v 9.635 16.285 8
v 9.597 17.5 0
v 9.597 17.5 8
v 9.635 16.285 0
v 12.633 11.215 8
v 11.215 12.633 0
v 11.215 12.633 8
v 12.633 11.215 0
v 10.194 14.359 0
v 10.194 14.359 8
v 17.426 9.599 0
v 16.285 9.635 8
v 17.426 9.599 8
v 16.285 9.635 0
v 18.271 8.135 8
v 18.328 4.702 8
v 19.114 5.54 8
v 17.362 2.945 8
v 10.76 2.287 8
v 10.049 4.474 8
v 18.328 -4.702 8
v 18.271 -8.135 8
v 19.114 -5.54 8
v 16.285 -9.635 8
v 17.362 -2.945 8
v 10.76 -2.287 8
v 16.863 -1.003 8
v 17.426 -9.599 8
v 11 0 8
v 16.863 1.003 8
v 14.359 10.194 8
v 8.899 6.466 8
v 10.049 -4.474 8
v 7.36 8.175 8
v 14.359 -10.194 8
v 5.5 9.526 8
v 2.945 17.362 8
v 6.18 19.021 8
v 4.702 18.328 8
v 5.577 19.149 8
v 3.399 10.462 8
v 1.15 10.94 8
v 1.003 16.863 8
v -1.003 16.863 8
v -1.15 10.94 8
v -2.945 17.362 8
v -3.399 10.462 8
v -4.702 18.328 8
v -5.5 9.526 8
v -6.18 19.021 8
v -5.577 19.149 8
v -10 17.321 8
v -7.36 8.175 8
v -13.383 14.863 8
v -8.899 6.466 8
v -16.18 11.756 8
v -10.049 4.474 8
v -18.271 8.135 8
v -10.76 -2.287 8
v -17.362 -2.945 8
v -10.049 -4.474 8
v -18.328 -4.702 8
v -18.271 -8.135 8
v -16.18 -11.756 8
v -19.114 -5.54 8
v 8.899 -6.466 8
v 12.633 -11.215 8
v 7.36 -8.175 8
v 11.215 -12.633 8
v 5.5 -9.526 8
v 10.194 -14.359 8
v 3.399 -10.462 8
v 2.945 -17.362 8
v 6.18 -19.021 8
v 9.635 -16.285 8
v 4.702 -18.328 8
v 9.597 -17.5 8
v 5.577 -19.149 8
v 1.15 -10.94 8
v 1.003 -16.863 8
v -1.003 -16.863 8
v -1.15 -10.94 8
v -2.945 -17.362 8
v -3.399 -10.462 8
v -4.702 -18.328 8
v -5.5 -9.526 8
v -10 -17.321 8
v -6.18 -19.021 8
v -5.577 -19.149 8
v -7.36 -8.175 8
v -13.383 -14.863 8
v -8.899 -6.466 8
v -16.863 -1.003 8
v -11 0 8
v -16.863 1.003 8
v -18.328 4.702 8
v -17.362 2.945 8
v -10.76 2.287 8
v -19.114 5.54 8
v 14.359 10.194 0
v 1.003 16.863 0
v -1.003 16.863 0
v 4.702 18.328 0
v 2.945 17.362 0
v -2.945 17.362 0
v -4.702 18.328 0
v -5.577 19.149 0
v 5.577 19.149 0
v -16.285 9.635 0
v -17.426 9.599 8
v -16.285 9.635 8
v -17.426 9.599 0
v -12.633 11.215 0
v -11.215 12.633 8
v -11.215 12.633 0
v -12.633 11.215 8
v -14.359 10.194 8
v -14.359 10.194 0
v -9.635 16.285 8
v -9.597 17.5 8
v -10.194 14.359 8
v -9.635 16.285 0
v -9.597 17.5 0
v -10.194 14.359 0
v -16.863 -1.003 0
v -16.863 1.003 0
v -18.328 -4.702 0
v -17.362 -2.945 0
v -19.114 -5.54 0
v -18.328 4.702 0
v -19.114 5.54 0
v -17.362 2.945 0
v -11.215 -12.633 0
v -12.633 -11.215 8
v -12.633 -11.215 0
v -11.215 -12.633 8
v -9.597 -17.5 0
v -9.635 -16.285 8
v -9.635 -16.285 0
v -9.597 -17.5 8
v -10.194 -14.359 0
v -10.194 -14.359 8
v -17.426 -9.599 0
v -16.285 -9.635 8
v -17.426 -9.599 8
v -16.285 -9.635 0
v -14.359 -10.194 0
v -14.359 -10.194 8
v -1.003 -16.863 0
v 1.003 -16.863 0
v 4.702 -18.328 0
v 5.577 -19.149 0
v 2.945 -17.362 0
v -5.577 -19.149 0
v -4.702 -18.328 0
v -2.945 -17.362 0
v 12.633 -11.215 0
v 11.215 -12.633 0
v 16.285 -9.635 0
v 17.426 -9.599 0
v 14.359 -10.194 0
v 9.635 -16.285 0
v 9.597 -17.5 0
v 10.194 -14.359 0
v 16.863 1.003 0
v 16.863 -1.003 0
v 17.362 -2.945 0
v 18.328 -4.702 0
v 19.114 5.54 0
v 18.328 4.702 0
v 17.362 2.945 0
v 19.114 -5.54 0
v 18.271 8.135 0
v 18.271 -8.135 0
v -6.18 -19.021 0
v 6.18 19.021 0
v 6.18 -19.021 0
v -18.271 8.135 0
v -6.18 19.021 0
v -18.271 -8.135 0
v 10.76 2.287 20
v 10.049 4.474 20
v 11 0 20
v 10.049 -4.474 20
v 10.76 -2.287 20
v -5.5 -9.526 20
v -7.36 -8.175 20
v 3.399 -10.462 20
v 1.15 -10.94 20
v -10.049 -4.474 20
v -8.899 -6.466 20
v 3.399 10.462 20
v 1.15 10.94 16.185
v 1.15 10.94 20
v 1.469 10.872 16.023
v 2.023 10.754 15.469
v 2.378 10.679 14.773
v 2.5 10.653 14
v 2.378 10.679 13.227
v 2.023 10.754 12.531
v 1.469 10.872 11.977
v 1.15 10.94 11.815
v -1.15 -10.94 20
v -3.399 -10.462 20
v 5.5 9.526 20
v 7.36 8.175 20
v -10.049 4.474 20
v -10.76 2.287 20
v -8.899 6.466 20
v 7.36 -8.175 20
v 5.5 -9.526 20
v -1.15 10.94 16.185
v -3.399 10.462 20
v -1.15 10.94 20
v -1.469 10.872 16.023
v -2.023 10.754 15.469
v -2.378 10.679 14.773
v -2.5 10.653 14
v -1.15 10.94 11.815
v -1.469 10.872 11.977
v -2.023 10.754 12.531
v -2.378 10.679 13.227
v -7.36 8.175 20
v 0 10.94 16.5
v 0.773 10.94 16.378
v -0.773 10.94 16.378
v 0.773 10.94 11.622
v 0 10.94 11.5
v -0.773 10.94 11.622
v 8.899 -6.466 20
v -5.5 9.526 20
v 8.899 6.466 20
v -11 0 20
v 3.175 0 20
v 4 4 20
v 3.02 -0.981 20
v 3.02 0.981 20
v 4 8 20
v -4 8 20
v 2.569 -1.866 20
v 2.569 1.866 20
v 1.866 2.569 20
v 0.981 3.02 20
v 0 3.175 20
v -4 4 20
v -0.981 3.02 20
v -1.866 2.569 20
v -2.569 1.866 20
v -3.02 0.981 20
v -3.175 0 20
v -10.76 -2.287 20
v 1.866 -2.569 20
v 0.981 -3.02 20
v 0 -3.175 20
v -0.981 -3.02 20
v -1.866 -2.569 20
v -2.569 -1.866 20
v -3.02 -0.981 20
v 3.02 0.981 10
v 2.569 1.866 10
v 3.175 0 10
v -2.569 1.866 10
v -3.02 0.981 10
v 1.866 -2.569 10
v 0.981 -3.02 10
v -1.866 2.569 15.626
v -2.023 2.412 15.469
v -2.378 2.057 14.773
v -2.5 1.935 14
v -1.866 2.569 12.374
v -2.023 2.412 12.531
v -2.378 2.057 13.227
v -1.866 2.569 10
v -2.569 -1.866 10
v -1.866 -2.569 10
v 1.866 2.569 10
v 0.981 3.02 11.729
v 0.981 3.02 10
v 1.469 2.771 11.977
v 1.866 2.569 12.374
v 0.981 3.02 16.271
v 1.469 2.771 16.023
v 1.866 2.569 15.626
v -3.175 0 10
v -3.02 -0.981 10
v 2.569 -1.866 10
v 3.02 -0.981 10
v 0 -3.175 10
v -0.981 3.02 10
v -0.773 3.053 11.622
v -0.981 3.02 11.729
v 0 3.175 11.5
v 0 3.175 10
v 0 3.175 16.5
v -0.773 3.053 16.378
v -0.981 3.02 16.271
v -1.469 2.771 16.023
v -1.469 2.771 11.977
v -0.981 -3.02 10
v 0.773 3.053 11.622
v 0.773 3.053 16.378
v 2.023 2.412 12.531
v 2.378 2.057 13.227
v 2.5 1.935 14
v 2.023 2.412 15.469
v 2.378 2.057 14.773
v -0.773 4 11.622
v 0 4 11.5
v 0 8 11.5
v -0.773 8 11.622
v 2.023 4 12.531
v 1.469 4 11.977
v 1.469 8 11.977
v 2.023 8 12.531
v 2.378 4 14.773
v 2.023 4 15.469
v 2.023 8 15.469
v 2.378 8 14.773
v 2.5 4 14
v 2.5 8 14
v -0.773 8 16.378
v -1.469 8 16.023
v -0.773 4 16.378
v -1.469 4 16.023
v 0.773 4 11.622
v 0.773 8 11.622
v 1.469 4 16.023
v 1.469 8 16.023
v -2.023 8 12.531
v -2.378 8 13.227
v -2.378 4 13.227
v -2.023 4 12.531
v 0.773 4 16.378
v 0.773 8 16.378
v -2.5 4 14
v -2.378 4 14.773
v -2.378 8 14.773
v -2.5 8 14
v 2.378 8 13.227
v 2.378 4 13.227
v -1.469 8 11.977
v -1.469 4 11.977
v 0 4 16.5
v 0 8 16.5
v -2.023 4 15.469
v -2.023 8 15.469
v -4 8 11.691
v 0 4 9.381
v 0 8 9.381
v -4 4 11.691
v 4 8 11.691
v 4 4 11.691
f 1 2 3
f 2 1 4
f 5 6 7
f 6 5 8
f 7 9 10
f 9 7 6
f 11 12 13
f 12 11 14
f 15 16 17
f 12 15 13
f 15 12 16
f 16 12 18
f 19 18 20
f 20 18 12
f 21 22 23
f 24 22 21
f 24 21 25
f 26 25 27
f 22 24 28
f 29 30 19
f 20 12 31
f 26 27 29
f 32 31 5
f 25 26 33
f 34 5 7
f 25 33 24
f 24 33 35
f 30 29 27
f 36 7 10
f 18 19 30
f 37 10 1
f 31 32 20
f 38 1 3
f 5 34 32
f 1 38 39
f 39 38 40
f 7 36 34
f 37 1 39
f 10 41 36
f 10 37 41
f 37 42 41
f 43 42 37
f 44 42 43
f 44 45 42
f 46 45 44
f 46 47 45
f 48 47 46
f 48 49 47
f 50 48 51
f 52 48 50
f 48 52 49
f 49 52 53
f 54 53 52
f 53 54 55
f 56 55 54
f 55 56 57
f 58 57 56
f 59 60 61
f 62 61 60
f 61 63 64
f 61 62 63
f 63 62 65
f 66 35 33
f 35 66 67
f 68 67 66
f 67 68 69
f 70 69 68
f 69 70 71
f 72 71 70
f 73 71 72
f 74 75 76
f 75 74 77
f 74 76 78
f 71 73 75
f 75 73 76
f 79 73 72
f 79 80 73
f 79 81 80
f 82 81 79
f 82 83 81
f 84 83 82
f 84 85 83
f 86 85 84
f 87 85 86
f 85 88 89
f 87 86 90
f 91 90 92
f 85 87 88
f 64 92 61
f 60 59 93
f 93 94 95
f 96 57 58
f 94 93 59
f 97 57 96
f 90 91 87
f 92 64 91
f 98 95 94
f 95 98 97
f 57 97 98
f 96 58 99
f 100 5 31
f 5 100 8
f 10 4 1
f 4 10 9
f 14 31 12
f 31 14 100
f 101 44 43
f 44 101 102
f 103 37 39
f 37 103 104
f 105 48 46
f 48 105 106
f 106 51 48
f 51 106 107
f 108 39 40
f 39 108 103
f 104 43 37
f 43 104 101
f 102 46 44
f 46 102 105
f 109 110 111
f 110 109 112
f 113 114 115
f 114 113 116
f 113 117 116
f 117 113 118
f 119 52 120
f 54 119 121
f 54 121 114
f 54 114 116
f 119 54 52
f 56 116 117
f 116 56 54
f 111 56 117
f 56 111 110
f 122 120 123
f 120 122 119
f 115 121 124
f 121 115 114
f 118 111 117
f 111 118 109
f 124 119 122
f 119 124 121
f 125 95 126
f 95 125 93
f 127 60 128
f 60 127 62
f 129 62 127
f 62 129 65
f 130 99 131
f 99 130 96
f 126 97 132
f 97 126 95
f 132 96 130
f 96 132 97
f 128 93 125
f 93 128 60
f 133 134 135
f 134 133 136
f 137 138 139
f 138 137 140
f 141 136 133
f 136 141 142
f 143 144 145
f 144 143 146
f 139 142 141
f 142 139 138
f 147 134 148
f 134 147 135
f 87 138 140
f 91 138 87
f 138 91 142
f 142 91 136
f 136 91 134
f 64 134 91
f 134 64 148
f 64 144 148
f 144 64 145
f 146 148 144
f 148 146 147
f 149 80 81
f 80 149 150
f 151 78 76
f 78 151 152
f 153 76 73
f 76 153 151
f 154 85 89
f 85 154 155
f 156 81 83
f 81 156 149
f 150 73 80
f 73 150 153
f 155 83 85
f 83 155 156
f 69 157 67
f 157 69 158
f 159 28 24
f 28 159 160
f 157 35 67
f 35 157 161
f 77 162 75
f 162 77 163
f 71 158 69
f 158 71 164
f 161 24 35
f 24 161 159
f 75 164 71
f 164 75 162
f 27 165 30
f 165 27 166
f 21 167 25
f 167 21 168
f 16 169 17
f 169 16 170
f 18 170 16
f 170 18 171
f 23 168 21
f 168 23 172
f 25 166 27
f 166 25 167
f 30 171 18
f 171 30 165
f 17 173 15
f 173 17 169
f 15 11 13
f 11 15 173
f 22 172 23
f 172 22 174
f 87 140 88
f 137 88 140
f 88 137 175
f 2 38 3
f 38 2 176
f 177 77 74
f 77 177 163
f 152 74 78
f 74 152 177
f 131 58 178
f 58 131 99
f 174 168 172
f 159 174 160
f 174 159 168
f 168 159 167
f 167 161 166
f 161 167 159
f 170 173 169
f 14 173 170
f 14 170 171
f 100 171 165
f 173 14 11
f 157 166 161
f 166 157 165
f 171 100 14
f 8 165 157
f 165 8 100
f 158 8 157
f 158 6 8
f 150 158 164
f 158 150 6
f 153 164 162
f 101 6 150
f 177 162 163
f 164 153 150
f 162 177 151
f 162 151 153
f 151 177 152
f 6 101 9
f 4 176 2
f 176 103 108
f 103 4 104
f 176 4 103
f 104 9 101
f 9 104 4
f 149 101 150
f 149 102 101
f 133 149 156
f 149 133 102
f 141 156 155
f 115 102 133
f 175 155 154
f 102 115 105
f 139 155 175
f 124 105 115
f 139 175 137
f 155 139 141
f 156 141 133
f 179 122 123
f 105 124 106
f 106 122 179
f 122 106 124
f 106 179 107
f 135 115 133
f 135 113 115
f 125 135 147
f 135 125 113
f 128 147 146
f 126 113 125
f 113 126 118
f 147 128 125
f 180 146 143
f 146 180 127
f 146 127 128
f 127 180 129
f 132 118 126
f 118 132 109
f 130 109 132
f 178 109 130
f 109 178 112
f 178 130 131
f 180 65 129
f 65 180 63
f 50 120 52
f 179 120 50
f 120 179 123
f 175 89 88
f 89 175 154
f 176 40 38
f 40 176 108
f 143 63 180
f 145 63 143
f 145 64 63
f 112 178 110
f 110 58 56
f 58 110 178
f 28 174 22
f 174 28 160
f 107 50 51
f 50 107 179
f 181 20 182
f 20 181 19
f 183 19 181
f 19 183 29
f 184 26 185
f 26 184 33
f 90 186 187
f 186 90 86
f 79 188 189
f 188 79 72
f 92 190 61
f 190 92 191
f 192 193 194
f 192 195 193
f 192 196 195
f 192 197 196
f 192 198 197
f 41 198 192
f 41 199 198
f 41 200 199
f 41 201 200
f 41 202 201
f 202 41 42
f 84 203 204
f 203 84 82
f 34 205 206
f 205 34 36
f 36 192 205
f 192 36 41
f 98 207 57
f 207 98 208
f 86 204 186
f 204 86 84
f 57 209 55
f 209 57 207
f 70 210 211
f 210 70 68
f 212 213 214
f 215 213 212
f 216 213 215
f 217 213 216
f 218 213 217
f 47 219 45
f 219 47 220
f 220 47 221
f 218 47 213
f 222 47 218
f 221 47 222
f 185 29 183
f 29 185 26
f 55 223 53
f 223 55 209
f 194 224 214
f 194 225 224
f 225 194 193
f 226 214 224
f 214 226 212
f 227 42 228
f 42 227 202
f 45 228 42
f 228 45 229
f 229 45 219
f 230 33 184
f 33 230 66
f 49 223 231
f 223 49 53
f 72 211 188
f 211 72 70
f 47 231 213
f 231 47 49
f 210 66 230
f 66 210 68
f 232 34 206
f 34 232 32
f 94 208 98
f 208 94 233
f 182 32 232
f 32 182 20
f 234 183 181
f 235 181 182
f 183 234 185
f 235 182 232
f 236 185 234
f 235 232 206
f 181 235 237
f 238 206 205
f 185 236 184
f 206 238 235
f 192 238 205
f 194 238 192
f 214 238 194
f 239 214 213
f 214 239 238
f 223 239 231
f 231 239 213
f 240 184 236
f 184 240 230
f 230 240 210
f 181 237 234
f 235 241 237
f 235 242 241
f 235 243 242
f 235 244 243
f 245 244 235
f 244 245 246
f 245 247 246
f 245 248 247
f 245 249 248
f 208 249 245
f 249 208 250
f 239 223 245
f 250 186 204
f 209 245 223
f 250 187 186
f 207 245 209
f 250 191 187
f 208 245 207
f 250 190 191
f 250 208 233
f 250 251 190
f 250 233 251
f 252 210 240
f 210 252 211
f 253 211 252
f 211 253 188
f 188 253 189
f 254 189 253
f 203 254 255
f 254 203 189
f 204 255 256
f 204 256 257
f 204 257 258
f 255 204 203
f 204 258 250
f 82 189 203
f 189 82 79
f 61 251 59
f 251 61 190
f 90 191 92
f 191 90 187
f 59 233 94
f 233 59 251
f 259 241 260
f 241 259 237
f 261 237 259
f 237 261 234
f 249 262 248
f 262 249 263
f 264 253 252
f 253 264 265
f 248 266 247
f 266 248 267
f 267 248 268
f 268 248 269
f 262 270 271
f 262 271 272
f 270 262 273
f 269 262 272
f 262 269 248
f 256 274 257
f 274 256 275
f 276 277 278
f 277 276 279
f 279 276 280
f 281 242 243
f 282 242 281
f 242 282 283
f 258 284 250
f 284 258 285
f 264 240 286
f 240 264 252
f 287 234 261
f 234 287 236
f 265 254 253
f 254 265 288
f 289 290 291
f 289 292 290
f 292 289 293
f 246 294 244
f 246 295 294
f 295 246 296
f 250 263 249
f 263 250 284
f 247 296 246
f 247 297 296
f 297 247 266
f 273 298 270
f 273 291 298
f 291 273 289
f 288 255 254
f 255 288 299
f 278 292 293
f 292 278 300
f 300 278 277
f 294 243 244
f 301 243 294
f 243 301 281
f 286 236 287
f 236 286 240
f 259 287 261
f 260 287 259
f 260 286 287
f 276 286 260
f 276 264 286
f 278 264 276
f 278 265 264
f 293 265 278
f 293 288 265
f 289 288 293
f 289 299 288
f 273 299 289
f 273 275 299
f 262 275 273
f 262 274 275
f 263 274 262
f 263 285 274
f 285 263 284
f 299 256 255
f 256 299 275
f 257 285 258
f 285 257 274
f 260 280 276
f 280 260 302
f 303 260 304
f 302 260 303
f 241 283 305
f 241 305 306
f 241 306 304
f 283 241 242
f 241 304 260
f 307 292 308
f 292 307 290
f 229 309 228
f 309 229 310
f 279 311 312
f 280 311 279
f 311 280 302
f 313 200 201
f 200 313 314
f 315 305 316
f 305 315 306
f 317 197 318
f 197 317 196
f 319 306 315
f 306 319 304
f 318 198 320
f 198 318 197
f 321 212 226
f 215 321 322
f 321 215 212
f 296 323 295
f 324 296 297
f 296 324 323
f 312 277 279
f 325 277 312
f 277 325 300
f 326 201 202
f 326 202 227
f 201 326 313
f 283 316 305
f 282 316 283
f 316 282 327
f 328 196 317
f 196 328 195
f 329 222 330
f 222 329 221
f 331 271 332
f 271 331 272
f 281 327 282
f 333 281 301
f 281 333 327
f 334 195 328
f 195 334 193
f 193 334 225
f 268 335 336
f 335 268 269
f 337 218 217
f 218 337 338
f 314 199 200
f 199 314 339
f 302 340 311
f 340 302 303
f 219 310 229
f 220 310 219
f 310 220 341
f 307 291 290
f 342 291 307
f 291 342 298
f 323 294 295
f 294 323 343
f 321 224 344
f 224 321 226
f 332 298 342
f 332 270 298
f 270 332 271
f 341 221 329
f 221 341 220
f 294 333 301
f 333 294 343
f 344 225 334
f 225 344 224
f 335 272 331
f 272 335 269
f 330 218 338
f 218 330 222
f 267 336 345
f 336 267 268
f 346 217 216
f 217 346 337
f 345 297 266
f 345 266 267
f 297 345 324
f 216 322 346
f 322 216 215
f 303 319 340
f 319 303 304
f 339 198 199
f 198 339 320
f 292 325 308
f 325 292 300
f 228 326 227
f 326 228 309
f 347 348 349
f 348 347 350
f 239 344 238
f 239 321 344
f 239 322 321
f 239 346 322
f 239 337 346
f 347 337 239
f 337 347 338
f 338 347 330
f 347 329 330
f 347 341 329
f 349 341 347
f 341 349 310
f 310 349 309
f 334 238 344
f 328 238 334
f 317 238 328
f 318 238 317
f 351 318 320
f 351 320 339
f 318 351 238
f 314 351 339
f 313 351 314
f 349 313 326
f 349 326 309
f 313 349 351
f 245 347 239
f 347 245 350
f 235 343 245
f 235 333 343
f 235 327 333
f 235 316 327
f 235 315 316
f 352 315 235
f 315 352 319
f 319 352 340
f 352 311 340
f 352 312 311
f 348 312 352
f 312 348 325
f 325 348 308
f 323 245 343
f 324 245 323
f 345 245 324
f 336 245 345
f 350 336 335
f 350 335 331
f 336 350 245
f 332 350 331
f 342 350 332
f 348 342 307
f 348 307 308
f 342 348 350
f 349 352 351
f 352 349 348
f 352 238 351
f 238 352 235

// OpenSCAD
total_height=20;
motor_shaft_depth=10;
motor_shaft_diameter=6.350; //nema 23

m5_shaft_diameter=5;
//took actual measurements of a nut
m5_nut_flat_width=8; // some references say 7.612;
m5_nut_thickness=4;

m5_nut_corner_width=(2/sqrt(3))*m5_nut_flat_width;

cross_shaft_placement=14;
cross_shaft_length=30; //arbitrary, but so we don't have magic numbers below

module knob_top() {
  max_radius=20;
  scallop_radius=8;
  thickness=8;

  difference() {
    //shallow cylinder
    cylinder(h=thickness,r=max_radius);

    //"scallops"
    for(n=[1:8]) {
      rotate( n * 360 / 8, [0, 0, 1])
        translate([max_radius+.6*scallop_radius, 0, 0])
          cylinder(h=thickness*2, r = scallop_radius, center=true,$fn=25);
    }
  }
}

//choose a slot type
module hexslot() {
  box_height=10; 
  union() {
    rotate([90,90,0])
      cylinder (h = m5_nut_thickness, r = m5_nut_corner_width / 2, center = true, $fn = 6);
    translate([0,0,box_height/2]) cube([m5_nut_flat_width,m5_nut_thickness,box_height], center=true);
  }
}
module squareslot() {
  cube([m5_nut_flat_width,m5_nut_thickness,15], center=true);
}

knob_top();

//shaft coupling
difference() {
  difference() {
    difference() {
      //11mm radius cylinder
      cylinder(h=total_height, r=11);
      //- 1/4 inch diamater cylinder, z+10, 20 height (could be infinite
      translate([0,0,(total_height-motor_shaft_depth)]) 
        cylinder(h=motor_shaft_depth, r=motor_shaft_diameter/2, $fn=20);
    }

    // hex nut side shaft
    translate([0,cross_shaft_length/2,cross_shaft_placement]) 
      rotate ([90,0,0]) 
        cylinder (h = cross_shaft_length, r=m5_shaft_diameter/2, center = true, $fn=20);
  }
  translate([0,6,cross_shaft_placement]) //6 is just a position between the shaft and outside
    hexslot();
    //squareslot();
}
